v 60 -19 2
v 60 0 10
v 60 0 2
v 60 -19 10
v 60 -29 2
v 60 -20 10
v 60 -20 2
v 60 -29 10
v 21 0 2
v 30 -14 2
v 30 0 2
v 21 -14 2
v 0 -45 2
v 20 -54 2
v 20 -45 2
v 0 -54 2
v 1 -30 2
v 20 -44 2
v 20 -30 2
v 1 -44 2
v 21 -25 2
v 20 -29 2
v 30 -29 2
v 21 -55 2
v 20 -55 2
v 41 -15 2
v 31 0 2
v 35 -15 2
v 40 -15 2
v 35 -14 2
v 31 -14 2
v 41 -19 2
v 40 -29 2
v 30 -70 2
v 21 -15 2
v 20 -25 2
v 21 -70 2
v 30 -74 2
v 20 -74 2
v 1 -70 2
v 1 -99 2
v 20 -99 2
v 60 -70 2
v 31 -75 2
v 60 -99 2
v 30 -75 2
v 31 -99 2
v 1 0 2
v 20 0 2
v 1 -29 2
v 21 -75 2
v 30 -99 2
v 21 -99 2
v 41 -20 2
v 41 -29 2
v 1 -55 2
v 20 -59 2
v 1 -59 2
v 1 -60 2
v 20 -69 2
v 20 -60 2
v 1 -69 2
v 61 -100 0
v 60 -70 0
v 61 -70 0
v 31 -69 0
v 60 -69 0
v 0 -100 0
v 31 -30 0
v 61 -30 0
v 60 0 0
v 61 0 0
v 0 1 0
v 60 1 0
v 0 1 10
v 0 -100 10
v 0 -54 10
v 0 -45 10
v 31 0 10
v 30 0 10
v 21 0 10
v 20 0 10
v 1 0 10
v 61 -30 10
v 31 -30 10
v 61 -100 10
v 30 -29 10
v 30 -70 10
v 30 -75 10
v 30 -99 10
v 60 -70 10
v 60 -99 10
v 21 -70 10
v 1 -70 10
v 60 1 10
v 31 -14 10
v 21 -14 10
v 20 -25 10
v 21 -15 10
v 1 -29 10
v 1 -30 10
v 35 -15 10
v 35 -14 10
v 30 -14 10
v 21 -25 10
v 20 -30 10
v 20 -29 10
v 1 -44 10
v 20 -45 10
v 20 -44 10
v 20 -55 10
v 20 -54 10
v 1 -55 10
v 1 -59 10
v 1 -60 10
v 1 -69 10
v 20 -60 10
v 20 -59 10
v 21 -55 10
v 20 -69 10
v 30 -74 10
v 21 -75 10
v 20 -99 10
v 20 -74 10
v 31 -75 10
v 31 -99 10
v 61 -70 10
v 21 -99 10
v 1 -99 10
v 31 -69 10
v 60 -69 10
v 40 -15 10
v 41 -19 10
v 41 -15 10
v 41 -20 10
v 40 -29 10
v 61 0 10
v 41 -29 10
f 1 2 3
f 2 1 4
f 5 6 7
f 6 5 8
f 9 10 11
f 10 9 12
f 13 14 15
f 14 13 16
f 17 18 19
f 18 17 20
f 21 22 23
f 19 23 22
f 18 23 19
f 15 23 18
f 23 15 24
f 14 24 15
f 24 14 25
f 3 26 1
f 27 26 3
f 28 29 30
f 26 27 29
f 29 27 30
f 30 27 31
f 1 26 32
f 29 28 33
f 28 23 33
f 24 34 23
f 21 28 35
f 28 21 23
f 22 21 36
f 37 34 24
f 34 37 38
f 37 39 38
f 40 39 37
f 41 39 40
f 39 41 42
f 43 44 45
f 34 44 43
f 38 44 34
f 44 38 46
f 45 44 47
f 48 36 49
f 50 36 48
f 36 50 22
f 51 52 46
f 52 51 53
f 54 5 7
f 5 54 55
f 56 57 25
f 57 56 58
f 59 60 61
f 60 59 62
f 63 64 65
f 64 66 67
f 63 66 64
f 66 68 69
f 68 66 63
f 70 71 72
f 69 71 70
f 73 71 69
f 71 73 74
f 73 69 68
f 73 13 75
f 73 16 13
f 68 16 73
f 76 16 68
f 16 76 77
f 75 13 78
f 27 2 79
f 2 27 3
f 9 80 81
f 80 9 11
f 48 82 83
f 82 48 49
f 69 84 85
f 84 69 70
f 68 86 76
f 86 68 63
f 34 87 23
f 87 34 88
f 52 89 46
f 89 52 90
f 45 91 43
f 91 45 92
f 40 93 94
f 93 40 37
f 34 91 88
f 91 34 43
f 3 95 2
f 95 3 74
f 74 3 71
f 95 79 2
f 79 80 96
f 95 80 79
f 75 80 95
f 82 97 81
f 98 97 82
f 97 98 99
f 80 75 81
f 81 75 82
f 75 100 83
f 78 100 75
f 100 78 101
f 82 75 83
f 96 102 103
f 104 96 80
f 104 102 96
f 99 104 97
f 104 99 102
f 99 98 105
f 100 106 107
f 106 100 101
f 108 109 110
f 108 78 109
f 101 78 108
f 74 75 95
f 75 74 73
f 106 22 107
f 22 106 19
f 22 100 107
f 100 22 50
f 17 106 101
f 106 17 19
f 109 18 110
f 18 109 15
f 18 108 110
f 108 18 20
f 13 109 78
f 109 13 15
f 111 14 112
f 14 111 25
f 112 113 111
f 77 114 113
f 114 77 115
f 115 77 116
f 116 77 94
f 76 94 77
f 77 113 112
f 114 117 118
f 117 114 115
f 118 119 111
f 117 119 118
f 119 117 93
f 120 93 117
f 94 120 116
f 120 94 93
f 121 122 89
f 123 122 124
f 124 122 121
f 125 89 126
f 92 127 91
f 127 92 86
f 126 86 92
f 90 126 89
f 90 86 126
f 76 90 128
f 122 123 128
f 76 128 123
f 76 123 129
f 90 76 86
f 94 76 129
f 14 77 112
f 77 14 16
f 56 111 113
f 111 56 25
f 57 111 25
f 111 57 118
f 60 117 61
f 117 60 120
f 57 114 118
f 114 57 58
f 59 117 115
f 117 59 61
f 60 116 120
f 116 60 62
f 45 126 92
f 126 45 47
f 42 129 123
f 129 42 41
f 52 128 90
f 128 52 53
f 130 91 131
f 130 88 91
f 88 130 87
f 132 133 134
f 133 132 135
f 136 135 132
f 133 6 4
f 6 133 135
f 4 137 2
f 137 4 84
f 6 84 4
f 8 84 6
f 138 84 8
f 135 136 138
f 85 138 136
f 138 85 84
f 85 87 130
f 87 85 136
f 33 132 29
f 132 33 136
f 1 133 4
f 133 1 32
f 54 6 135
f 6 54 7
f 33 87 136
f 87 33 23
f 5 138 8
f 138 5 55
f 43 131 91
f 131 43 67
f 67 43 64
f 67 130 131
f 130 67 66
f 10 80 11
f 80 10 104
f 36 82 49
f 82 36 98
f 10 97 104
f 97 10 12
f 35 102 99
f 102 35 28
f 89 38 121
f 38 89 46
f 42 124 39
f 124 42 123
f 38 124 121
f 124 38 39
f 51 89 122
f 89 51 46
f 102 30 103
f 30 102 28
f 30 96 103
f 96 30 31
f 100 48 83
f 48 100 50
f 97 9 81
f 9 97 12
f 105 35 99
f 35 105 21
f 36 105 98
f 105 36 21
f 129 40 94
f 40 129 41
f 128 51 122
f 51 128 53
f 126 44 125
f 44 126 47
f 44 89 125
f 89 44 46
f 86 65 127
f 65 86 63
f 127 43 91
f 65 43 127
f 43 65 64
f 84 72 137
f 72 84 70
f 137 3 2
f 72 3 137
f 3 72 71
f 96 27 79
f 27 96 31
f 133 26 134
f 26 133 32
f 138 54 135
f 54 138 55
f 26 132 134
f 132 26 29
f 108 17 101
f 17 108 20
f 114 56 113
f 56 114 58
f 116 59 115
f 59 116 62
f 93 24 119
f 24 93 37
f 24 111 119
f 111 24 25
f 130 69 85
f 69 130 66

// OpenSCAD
//1 этаж

{translate([0,-30,0])
cube([60,30,2]);
translate([0,0,0])
rotate([0,0,270])
cube([100,30,2]);
translate([0,-100,0])
cube([60,30,2]);
}
{
translate([0,0,0])
cube([60,1,10]);
translate([0,-30,0])
cube([20,1,10]);
translate([0,-45,0])
cube([20,1,10]);
translate([0,-55,0])
cube([20,1,10]);
translate([0,-60,0])
cube([20,1,10]);
translate([0,-70,0])
cube([20,1,10]);
translate([0,-100,0])
cube([60,1,10]);
translate([40,-20,0])
cube([20,1,10]);
translate([40,-30,0])
cube([20,1,10]);
translate([30,-70,0])
cube([30,1,10]);
translate([20,-15,0])
cube([10,1,10]);
translate([20,-75,0])
cube([10,1,10]);
translate([30,-15,0])
cube([5,1,10]);
translate([30,-30,0])
cube([10,1,10]);
}
{
translate([0,-30,0])
cube([1,30,10]);
translate([20,-25,0])
cube([1,25,10]);
translate([0,-100,0])
cube([1,30,10]);
translate([20,-100,0])
cube([1,25,10]);
translate([30,-100,0])
cube([1,25,10]);
translate([60,-100,0])
cube([1,30,10]);
translate([60,-30,0])
cube([1,30,10]);
translate([30,-15,0])
cube([1,15,10]);
translate([40,-30,0])
cube([1,15,10]);
translate([0,-45,0])
cube([1,15,10]);
translate([0,-70,0])
cube([1,15,10]);
translate([20,-70,0])
cube([1,15,10]);
translate([30,-70,0])
cube([1,40,10]);
}
